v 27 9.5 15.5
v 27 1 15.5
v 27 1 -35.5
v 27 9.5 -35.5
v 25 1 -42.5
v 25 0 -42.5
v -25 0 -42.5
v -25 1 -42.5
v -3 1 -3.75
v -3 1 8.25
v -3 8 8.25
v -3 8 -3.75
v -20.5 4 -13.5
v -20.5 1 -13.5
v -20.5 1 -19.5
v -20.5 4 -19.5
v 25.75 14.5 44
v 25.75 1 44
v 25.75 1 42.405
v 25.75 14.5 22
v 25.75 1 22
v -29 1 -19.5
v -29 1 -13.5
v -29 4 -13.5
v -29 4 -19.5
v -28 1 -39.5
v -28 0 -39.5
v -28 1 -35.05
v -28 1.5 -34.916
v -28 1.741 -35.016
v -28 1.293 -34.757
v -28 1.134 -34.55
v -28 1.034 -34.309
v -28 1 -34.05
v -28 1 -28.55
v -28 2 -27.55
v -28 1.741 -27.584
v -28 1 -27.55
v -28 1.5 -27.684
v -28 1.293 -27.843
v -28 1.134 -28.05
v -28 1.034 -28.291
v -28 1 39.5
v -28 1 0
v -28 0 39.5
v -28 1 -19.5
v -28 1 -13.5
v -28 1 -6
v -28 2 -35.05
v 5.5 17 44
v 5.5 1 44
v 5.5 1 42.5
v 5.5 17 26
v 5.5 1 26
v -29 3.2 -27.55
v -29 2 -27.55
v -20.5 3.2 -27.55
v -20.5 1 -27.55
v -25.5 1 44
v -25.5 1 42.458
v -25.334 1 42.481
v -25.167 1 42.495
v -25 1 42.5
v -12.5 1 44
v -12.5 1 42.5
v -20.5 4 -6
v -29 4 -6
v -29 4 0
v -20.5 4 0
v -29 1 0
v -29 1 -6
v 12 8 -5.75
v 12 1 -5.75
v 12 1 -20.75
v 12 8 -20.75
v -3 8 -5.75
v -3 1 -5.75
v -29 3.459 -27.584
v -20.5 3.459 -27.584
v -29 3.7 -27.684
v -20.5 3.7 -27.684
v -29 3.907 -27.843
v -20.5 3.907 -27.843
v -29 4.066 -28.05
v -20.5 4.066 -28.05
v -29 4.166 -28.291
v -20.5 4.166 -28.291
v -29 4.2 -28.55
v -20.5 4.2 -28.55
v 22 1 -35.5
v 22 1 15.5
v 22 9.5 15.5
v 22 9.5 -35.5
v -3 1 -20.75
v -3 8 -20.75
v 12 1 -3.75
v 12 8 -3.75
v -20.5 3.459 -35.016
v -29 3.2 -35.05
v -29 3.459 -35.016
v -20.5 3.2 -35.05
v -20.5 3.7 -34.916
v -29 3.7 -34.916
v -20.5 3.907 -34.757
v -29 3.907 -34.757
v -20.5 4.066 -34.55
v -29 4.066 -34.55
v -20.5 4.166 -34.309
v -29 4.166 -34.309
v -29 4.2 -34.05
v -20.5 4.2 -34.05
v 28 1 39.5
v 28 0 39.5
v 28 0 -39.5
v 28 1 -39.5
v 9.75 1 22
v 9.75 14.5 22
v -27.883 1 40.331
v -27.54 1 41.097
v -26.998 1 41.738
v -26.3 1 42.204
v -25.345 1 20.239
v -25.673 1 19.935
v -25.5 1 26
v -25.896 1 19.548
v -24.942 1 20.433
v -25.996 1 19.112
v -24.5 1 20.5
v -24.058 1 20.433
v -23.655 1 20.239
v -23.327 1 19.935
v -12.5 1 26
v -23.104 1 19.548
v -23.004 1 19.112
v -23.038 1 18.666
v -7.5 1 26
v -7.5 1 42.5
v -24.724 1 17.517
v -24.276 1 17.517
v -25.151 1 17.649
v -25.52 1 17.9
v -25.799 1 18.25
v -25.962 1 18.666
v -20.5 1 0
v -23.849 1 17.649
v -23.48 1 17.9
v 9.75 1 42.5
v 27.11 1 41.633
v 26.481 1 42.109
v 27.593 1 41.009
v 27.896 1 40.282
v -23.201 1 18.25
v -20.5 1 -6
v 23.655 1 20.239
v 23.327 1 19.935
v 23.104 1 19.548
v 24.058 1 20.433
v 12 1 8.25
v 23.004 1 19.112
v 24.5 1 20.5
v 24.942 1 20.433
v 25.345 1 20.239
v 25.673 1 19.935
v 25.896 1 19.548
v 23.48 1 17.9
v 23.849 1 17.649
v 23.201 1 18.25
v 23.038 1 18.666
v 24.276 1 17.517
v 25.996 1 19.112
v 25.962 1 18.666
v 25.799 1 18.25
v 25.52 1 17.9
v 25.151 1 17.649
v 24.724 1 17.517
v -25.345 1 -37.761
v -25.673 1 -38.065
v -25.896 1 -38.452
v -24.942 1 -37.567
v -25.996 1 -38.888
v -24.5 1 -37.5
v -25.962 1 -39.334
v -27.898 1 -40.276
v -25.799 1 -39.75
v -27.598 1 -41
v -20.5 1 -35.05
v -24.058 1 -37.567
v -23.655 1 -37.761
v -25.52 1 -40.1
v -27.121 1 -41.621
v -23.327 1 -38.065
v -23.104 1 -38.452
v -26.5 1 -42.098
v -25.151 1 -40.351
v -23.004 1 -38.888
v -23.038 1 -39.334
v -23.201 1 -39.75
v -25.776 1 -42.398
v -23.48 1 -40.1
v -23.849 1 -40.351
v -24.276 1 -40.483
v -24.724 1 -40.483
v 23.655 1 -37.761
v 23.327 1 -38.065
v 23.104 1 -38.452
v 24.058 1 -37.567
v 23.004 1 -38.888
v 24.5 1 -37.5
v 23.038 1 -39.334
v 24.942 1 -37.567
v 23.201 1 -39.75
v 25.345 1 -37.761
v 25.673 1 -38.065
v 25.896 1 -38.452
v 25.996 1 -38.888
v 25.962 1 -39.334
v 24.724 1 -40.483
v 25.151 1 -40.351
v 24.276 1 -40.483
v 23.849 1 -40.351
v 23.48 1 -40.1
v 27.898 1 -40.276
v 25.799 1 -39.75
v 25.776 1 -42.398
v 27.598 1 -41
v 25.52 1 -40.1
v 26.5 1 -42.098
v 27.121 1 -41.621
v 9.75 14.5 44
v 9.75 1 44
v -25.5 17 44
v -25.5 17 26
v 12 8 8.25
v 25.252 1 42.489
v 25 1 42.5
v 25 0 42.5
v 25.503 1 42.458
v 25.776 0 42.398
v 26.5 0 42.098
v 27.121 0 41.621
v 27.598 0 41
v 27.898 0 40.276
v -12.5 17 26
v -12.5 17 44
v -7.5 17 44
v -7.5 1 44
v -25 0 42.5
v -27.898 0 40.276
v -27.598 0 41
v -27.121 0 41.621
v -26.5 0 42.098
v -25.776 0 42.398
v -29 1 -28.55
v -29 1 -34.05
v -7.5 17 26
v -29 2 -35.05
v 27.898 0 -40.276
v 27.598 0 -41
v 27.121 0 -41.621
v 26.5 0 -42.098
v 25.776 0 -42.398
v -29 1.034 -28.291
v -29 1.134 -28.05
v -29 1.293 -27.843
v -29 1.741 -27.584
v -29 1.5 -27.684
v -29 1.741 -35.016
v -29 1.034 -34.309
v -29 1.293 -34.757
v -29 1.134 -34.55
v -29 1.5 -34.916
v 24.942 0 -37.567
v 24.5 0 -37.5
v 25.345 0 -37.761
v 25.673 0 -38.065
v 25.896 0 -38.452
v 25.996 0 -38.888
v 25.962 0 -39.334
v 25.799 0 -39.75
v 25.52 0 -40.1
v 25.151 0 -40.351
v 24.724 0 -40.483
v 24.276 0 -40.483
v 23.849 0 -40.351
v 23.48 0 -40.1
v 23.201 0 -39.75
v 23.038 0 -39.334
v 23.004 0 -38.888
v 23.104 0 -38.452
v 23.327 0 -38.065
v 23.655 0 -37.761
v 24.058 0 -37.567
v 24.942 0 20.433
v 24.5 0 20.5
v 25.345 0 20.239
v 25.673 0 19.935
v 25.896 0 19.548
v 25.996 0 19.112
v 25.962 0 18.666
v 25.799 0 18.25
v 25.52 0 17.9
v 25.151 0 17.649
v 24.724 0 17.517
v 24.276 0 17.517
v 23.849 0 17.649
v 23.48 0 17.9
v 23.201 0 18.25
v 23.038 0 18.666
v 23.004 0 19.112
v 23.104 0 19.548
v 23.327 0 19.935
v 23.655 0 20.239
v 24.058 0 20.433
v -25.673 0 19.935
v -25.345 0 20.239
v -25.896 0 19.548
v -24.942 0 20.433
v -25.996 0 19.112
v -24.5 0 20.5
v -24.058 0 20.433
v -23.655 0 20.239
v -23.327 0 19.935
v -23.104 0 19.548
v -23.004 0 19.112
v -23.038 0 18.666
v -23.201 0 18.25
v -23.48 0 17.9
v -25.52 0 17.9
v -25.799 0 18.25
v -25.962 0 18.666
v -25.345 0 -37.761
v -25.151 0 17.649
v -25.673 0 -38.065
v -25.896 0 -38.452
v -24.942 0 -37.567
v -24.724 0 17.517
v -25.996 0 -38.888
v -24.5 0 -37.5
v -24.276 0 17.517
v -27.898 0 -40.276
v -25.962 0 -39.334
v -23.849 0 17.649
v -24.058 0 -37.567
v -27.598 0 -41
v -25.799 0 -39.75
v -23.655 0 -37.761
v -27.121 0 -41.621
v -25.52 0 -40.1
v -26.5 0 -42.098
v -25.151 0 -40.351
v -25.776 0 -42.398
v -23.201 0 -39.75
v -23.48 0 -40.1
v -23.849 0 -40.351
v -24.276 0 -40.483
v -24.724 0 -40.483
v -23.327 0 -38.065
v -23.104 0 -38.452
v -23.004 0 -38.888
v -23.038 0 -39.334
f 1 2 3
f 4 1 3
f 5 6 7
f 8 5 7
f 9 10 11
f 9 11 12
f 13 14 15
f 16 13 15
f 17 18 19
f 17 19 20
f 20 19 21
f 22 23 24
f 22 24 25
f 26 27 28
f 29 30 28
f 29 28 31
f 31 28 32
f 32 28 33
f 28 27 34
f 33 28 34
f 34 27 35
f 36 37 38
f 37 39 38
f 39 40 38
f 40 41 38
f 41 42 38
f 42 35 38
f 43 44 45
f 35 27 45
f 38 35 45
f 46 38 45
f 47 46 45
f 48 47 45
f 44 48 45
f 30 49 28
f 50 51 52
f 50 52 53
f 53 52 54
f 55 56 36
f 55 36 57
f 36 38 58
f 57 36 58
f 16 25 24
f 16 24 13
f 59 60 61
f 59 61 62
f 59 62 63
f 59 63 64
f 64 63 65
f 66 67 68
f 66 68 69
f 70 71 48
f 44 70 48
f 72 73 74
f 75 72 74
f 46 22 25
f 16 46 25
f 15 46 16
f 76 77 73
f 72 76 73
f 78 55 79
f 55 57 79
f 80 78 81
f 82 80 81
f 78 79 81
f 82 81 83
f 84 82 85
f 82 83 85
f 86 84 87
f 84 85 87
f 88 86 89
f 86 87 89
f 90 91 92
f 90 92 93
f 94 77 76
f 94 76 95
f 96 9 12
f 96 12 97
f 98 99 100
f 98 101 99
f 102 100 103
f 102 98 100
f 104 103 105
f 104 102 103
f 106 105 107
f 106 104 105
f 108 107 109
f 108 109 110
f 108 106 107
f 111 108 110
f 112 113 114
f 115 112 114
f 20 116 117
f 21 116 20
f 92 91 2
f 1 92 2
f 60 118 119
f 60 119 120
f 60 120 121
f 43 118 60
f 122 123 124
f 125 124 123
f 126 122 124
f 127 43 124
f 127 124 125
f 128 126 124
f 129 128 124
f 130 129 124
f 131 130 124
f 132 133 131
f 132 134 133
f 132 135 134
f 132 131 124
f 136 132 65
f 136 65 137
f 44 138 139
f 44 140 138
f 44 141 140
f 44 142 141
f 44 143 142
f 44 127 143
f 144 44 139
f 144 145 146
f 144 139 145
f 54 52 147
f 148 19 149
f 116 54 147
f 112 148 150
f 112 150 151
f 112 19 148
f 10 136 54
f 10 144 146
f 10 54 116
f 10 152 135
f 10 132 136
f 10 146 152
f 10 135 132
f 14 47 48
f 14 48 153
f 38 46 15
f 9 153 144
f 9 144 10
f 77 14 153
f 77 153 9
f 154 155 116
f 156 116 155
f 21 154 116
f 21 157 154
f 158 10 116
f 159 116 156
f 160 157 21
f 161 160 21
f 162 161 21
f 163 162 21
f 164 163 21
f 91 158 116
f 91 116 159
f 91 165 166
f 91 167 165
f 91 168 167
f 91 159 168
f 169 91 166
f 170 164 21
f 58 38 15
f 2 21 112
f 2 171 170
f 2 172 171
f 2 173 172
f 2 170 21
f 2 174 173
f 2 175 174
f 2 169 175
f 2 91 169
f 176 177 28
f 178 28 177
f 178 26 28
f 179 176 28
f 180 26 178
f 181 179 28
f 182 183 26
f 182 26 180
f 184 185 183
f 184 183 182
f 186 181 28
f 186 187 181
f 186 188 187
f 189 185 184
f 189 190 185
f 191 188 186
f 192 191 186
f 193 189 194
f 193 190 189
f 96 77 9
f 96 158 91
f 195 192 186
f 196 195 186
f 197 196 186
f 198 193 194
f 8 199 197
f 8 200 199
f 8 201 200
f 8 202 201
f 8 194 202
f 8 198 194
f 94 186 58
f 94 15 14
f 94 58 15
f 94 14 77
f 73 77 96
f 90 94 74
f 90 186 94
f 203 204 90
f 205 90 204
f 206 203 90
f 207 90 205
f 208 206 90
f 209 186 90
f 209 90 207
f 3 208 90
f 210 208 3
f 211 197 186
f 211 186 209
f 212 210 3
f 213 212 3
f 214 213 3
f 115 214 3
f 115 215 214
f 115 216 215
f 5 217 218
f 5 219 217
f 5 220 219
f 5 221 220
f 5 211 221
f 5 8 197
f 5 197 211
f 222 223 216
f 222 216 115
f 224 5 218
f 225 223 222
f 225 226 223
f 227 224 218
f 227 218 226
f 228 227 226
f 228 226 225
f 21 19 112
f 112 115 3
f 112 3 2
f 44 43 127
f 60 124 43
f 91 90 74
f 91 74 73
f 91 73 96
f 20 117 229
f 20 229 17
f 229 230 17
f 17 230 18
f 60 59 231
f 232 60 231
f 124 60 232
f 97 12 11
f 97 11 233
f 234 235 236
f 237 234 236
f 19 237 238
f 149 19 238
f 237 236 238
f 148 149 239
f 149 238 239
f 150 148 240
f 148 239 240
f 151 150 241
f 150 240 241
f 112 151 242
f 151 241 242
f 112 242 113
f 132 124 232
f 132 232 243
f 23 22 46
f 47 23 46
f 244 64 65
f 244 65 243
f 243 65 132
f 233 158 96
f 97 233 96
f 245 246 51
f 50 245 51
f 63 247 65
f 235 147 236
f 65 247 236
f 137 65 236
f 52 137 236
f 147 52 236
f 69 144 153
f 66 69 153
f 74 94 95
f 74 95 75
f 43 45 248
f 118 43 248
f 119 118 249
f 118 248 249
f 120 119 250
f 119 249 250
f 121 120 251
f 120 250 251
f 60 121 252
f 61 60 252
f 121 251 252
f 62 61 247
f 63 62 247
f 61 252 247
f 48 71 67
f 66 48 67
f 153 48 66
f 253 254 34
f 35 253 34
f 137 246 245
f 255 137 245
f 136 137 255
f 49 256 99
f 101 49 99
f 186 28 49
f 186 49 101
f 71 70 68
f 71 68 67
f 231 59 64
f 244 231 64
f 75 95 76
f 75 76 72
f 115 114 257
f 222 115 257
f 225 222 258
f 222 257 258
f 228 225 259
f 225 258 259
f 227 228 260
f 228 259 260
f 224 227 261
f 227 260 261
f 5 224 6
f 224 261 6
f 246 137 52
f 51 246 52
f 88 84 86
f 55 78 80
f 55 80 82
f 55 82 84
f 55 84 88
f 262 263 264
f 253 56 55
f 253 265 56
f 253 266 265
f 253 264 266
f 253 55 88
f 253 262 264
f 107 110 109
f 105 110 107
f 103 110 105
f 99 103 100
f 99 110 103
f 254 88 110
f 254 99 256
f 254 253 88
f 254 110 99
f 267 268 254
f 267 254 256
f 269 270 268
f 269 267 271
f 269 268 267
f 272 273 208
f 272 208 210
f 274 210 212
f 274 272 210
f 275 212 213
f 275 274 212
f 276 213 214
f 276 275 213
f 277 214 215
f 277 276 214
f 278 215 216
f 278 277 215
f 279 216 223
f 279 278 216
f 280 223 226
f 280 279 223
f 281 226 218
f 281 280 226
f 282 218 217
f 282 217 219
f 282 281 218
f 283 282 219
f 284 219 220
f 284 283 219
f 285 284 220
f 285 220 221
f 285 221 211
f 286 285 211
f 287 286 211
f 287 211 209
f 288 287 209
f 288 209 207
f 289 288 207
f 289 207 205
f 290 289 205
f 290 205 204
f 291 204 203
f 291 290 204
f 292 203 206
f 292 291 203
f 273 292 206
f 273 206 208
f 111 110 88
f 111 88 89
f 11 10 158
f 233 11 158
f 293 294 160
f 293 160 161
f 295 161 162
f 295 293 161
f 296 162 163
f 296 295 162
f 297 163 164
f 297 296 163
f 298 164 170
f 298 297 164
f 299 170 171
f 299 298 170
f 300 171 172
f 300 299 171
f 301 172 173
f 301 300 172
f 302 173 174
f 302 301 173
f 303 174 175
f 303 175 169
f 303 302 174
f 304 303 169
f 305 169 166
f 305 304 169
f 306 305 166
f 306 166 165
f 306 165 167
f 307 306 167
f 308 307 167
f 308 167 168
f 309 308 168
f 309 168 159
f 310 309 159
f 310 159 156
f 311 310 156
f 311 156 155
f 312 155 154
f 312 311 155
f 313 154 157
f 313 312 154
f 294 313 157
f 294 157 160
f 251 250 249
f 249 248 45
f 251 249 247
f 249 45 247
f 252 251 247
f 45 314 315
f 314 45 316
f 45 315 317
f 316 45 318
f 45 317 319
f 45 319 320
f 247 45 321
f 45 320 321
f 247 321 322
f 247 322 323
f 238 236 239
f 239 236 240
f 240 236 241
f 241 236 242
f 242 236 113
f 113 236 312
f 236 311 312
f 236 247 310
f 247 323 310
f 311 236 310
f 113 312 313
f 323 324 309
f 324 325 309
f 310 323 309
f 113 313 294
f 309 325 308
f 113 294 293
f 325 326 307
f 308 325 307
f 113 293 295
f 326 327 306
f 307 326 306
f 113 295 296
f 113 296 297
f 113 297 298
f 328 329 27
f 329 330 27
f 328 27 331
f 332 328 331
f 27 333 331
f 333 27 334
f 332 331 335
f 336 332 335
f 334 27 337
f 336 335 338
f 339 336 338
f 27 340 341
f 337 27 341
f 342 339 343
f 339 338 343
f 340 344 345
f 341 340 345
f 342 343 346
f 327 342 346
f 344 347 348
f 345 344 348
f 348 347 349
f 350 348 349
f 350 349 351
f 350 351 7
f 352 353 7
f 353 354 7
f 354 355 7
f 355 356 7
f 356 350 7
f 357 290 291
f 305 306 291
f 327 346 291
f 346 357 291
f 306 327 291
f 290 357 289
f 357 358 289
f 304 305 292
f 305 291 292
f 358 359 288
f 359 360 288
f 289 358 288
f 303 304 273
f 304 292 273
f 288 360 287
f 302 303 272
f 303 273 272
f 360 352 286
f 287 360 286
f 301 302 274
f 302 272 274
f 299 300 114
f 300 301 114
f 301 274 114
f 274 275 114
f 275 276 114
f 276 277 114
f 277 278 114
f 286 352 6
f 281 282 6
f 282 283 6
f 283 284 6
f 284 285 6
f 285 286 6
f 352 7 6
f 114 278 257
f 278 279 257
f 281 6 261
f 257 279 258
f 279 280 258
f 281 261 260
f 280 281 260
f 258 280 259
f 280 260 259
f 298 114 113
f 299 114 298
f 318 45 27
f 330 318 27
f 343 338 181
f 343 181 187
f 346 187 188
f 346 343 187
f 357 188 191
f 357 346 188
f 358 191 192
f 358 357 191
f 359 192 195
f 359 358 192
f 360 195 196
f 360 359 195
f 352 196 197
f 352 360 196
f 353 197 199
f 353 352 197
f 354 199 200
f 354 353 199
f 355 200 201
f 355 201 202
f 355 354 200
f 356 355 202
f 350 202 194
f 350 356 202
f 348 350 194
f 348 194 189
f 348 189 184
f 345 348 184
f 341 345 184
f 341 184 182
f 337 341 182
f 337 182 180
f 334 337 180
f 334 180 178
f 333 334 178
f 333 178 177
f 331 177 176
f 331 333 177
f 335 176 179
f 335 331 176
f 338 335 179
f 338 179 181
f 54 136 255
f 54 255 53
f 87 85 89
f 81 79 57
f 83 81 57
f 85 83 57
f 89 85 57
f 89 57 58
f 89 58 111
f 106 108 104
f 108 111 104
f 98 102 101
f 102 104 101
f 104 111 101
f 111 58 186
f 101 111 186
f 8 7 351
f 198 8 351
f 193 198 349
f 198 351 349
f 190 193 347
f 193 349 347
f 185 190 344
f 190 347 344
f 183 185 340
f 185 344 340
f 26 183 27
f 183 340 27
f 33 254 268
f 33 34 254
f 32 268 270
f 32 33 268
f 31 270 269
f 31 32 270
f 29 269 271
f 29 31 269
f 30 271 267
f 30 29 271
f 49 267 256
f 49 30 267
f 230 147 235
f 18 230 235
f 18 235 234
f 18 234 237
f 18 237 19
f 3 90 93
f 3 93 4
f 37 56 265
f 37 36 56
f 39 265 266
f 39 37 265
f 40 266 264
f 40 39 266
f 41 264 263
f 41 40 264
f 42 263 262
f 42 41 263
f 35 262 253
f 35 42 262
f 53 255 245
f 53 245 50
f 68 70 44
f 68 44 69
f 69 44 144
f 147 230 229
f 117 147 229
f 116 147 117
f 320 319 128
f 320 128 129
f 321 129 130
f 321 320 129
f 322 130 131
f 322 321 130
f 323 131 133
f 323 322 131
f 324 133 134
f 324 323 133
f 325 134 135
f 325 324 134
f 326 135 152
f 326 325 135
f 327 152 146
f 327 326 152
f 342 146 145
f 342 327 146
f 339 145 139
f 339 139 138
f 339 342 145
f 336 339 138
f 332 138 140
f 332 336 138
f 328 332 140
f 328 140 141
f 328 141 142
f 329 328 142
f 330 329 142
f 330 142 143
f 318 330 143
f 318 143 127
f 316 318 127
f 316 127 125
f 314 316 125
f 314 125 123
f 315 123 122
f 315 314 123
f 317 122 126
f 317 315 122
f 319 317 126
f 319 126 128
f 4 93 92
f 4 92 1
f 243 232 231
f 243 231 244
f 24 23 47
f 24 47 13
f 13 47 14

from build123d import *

# Parameters (mm, degrees)
ESQUISSE1_R        = 1.5
BOSS_EXTRU_1_DEPTH = 1
ESQUISSE2_W        = 13
ESQUISSE2_H        = 18
BOSS_EXTRU_2_DEPTH = 16
ESQUISSE3_W        = 16
ESQUISSE3_H        = 22
BOSS_EXTRU_3_DEPTH = 13.5
ESQUISSE4_W        = 15
ESQUISSE4_H        = 15
ESQUISSE4_H_2      = 12
BOSS_EXTRU_4_DEPTH = 7
ESQUISSE5_W        = 8.5
ESQUISSE5_H        = 7.5
BOSS_EXTRU_5_DEPTH = 3.2
CONG_3_R           = 1
CONG_4_R           = 1
ESQUISSE6_W        = 8.5
ESQUISSE6_H        = 6
BOSS_EXTRU_6_DEPTH = 3
ESQUISSE7_W        = 5
ESQUISSE7_H        = 51
BOSS_EXTRU_7_DEPTH = 8.5


with BuildPart() as part:
    # Esquisse1 → Boss.-Extru.1 (new body)
    with BuildSketch(Plane(origin=(0, 0, 0), x_dir=(1, 0, 0), z_dir=(0, 1, 0))):
        with BuildLine():
            Line((-25, -42.5), (25, -42.5))
            ThreePointArc((25, -42.5), (27.121320344, -41.621320344), (28, -39.5))
            Line((28, -39.5), (28, 39.5))
            ThreePointArc((28, 39.5), (27.121320344, 41.621320344), (25, 42.5))
            Line((25, 42.5), (-25, 42.5))
            ThreePointArc((-25, 42.5), (-27.121320344, 41.621320344), (-28, 39.5))
            Line((-28, 39.5), (-28, -39.5))
            ThreePointArc((-28, -39.5), (-27.121320344, -41.621320344), (-25, -42.5))
        make_face()
        with Locations(Location((-24.5, 39, 0), (0, 0, 270))):
            Circle(ESQUISSE1_R, mode=Mode.SUBTRACT)
        with Locations(Location((24.5, 39, 0), (0, 0, 270))):
            Circle(ESQUISSE1_R, mode=Mode.SUBTRACT)
        with Locations(Location((-24.5, -19, 0), (0, 0, 270))):
            Circle(ESQUISSE1_R, mode=Mode.SUBTRACT)
        with Locations(Location((24.5, -19, 0), (0, 0, 270))):
            Circle(ESQUISSE1_R, mode=Mode.SUBTRACT)
    extrude(amount=BOSS_EXTRU_1_DEPTH)

    # Esquisse2 → Boss.-Extru.2 (add)
    with BuildSketch(Plane(origin=(0, 1, 0), x_dir=(1, 0, 0), z_dir=(0, 1, 0))):
        with Locations((-19, -35)):
            Rectangle(ESQUISSE2_W, ESQUISSE2_H)
        with Locations((-1, -35)):
            Rectangle(ESQUISSE2_W, ESQUISSE2_H)
    extrude(amount=BOSS_EXTRU_2_DEPTH)

    # Esquisse3 → Boss.-Extru.3 (add)
    with BuildSketch(Plane(origin=(0, 1, 0), x_dir=(1, 0, 0), z_dir=(0, 1, 0))):
        with Locations((17.75, -33)):
            Rectangle(ESQUISSE3_W, ESQUISSE3_H)
    extrude(amount=BOSS_EXTRU_3_DEPTH)

    # Esquisse4 → Boss.-Extru.4 (add)
    with BuildSketch(Plane(origin=(0, 1, 0), x_dir=(1, 0, 0), z_dir=(0, 1, 0))):
        with Locations((4.5, 13.25)):
            Rectangle(ESQUISSE4_W, ESQUISSE4_H)
        with Locations((4.5, -2.25)):
            Rectangle(ESQUISSE4_W, ESQUISSE4_H_2)
    extrude(amount=BOSS_EXTRU_4_DEPTH)

    # Esquisse5 → Boss.-Extru.5 (add)
    with BuildSketch(Plane(origin=(0, 1, 0), x_dir=(1, 0, 0), z_dir=(0, 1, 0))):
        with Locations((-24.75, 31.3)):
            Rectangle(ESQUISSE5_W, ESQUISSE5_H)
    extrude(amount=BOSS_EXTRU_5_DEPTH)

    # Congé3
    cong_3_edges = [part.edges().sort_by_distance(p)[0] for p in [
        (-24.75, 4.2, -27.55),
        (-24.75, 4.2, -35.05),
    ]]
    fillet(cong_3_edges, radius=CONG_3_R)

    # Congé4
    cong_4_edges = [part.edges().sort_by_distance(p)[0] for p in [
        (-28.5, 1, -27.55),
        (-28.5, 1, -35.05),
    ]]
    fillet(cong_4_edges, radius=CONG_4_R)

    # Esquisse6 → Boss.-Extru.6 (add)
    with BuildSketch(Plane(origin=(0, 1, 0), x_dir=(1, 0, 0), z_dir=(0, 1, 0))):
        with Locations((-24.75, 16.5)):
            Rectangle(ESQUISSE6_W, ESQUISSE6_H)
        with Locations((-24.75, 3)):
            Rectangle(ESQUISSE6_W, ESQUISSE6_H)
    extrude(amount=BOSS_EXTRU_6_DEPTH)

    # Esquisse7 → Boss.-Extru.7 (add)
    with BuildSketch(Plane(origin=(0, 1, 0), x_dir=(1, 0, 0), z_dir=(0, 1, 0))):
        with Locations((24.5, 10)):
            Rectangle(ESQUISSE7_W, ESQUISSE7_H)
    extrude(amount=BOSS_EXTRU_7_DEPTH)


solid = part.part
